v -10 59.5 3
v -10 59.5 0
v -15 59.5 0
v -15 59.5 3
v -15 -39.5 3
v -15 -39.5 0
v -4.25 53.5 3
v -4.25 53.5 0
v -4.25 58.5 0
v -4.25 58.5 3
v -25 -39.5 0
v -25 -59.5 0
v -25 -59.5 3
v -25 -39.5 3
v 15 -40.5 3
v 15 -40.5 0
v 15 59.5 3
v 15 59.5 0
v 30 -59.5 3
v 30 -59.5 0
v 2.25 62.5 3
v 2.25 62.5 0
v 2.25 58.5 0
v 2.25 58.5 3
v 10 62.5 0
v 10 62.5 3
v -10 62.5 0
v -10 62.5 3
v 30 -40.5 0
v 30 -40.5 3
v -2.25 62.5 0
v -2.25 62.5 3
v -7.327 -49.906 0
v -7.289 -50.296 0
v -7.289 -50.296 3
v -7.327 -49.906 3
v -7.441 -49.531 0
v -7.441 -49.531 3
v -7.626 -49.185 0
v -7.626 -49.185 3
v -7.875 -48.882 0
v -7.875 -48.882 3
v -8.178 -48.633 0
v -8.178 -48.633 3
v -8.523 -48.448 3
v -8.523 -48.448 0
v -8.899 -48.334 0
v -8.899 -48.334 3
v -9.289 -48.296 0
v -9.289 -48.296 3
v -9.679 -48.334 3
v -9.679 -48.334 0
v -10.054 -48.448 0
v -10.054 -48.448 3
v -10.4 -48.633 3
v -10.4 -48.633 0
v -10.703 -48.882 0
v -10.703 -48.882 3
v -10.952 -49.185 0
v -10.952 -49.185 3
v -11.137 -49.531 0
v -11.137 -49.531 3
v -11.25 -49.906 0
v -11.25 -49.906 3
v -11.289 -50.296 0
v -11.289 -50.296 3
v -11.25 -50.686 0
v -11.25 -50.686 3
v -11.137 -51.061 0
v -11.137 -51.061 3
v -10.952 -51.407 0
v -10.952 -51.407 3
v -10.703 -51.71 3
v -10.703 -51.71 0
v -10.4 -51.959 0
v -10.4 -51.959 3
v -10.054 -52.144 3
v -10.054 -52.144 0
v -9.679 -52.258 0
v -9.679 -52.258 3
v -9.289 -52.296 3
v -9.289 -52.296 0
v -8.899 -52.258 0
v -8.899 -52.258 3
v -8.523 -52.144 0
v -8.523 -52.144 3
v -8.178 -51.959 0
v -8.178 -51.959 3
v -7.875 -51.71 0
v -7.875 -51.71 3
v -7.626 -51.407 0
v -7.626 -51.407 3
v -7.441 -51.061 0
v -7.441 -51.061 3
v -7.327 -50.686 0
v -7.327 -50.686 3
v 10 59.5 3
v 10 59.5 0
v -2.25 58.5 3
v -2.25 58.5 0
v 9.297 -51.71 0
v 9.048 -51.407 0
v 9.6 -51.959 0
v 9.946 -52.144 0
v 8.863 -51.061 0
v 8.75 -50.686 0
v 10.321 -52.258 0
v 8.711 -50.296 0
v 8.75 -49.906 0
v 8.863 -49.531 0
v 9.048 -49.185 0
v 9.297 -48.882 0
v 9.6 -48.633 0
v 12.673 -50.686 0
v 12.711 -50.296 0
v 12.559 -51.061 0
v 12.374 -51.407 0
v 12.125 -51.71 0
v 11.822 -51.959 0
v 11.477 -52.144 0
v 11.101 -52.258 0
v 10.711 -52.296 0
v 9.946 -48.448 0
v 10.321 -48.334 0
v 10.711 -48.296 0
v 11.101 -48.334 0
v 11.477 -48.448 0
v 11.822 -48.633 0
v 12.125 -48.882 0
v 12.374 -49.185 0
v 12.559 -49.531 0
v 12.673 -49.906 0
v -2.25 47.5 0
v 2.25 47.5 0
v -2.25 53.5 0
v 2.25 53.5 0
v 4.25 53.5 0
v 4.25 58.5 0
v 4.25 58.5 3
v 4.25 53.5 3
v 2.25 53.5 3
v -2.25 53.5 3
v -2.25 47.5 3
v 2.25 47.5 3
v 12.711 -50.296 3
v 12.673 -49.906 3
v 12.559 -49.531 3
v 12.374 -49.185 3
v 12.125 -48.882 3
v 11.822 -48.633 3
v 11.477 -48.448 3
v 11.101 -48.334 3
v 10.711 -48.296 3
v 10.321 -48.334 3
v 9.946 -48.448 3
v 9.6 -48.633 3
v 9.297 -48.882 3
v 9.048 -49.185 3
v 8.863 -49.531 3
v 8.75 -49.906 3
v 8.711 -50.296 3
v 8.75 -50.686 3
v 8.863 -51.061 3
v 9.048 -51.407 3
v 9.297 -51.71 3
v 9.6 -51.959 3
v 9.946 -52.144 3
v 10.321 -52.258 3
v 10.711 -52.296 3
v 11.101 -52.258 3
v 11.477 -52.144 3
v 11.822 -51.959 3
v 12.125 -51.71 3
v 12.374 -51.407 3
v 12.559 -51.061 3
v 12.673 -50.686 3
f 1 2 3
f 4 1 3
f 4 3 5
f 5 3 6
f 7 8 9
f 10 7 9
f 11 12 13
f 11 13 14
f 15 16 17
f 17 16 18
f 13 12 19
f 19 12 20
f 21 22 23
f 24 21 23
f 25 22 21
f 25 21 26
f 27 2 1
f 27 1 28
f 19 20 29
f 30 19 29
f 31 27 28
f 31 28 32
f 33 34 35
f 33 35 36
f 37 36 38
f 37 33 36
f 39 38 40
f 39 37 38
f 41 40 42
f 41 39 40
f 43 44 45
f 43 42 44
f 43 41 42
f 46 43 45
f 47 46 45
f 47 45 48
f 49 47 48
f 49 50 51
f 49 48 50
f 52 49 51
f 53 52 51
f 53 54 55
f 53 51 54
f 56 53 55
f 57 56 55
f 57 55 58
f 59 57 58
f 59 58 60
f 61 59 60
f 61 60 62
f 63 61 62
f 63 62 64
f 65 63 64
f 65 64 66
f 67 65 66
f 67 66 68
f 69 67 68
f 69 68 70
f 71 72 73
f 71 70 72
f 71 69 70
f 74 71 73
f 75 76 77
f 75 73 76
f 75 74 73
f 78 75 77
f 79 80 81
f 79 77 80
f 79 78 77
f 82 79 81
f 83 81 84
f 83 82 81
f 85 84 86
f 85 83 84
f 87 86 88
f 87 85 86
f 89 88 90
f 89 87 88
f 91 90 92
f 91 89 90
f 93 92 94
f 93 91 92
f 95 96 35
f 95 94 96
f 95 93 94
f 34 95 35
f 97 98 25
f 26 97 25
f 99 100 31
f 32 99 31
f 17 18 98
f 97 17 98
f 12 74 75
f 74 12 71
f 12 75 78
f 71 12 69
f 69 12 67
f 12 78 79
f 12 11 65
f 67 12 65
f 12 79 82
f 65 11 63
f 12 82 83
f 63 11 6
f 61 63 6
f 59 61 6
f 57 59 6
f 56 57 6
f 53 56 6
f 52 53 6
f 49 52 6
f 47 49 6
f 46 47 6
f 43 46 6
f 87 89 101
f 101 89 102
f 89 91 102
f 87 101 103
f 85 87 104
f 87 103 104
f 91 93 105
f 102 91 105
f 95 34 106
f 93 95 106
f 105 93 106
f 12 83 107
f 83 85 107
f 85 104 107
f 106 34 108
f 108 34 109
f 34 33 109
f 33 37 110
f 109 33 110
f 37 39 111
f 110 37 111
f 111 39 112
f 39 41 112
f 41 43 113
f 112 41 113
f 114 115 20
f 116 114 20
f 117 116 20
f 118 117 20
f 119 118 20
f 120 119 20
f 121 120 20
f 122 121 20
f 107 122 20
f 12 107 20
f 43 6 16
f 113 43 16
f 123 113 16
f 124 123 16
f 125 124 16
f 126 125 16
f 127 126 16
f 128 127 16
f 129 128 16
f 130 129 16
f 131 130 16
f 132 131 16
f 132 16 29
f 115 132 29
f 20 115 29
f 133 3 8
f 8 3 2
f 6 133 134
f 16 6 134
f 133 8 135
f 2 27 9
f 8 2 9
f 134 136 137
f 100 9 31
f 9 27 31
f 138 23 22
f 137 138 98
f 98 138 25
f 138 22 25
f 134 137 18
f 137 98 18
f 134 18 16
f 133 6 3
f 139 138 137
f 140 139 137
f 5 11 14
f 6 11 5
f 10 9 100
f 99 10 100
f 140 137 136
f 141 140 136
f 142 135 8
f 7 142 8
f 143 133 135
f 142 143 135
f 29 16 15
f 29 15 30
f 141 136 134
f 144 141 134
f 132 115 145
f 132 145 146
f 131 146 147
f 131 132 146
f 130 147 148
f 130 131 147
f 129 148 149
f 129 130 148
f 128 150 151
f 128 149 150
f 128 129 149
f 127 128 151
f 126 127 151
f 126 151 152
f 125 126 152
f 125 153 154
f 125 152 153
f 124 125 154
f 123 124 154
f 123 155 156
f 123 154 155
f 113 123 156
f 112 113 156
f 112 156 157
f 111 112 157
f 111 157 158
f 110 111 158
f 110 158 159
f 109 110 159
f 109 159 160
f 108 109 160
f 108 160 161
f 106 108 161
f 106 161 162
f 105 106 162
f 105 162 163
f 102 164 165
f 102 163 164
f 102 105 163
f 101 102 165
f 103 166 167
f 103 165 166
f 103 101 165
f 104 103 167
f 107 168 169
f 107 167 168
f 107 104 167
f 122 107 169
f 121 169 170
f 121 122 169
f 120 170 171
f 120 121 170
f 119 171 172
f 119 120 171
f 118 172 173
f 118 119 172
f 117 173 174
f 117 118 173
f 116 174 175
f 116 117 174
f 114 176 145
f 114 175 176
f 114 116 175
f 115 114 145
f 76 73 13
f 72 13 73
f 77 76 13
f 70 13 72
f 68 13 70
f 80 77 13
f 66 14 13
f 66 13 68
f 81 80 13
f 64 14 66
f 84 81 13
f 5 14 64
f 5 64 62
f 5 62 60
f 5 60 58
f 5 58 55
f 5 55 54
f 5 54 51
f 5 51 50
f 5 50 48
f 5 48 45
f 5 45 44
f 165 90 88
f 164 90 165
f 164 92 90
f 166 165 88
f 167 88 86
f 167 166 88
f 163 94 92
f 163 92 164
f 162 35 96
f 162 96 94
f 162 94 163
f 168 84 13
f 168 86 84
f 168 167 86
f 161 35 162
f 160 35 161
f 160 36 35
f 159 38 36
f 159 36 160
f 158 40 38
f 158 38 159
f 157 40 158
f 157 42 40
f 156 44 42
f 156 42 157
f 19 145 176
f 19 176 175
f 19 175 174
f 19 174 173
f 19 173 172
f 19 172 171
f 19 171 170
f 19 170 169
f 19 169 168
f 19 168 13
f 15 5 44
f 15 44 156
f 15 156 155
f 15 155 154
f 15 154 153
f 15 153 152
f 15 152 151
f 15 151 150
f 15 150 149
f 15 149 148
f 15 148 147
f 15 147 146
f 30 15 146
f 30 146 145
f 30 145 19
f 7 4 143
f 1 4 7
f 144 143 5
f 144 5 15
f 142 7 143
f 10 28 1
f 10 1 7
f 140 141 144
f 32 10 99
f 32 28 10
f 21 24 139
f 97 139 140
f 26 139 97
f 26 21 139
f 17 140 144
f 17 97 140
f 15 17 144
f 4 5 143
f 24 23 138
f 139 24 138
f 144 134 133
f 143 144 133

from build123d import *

# Parameters (mm, degrees)
SKETCH_1_W               = 10
SKETCH_1_H               = 20
SKETCH_1_W_2             = 15
SKETCH_1_H_2             = 19
SKETCH_1_W_3             = 7.75
SKETCH_1_H_3             = 3
EXTRUDE_1_DEPTH          = 3
CUT_EXTRUDE_1_DEPTH      = 70.392002421
CUT_EXTRUDE_1_DEPTH_BACK = 70.392002421
SKETCH_2_R               = 2


with BuildPart() as part:
    # 草图1 → 凸台-拉伸1 (new body)
    with BuildSketch(Plane.XY):
        with Locations((-20, -49.5)):
            Rectangle(SKETCH_1_W, SKETCH_1_H)
        with Locations((22.5, -50)):
            Rectangle(SKETCH_1_W_2, SKETCH_1_H_2)
        Polygon((-2.25, 58.5), (-2.25, 59.5), (-10, 59.5), (-15, 59.5), (-15, -39.5), (-15, -59.5), (15, -59.5), (15, -40.5), (15, 59.5), (10, 59.5), (2.25, 59.5), (2.25, 58.5), (4.25, 58.5), (4.25, 53.5), (2.25, 53.5), (2.25, 47.5), (-2.25, 47.5), (-2.25, 53.5), (-4.25, 53.5), (-4.25, 58.5), align=None)
        with Locations((6.125, 61)):
            Rectangle(SKETCH_1_W_3, SKETCH_1_H_3)
        with Locations((-6.125, 61)):
            Rectangle(SKETCH_1_W_3, SKETCH_1_H_3)
    extrude(amount=EXTRUDE_1_DEPTH)

    # 草图2 → 切除-拉伸1 (cut, two sides: drawn at the far end of the back side and taken through both)
    with BuildSketch(Plane.XY.offset(3).offset(-CUT_EXTRUDE_1_DEPTH_BACK)):
        with Locations((-9.288837026, -50.295936885)):
            Circle(SKETCH_2_R)
        with Locations((10.711162974, -50.295936885)):
            Circle(SKETCH_2_R)
    extrude(amount=CUT_EXTRUDE_1_DEPTH + CUT_EXTRUDE_1_DEPTH_BACK, mode=Mode.SUBTRACT)


solid = part.part
